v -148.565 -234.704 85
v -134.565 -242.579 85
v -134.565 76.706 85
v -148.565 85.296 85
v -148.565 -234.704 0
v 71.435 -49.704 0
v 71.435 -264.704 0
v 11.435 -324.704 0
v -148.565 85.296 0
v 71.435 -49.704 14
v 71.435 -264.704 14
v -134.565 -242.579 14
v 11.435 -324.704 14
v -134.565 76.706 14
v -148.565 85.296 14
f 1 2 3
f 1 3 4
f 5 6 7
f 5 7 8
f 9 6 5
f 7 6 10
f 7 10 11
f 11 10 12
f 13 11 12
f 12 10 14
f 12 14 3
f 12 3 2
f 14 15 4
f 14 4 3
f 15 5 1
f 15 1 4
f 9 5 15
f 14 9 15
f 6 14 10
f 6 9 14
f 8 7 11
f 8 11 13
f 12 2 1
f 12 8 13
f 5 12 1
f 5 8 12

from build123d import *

# Parameters (mm, degrees)
EXTRUDE_1_DEPTH = 14
EXTRUDE_2_DEPTH = 71


with BuildPart() as part:
    # 草图1 → 凸台-拉伸1 (new body)
    with BuildSketch(Plane.XY):
        Polygon((71.4349048, -49.703584356), (71.4349048, -264.703584356), (11.4349048, -324.703584356), (-148.5650952, -234.703584356), (-148.5650952, 85.296415644), align=None)
    extrude(amount=EXTRUDE_1_DEPTH)

    # 草图2 → 凸台-拉伸2 (add)
    with BuildSketch(Plane.XY.offset(14)):
        Polygon((-134.5650952, 76.705506553), (-134.5650952, -242.578584356), (-148.5650952, -234.703584356), (-148.5650952, 85.296415644), align=None)
    extrude(amount=EXTRUDE_2_DEPTH)


solid = part.part
